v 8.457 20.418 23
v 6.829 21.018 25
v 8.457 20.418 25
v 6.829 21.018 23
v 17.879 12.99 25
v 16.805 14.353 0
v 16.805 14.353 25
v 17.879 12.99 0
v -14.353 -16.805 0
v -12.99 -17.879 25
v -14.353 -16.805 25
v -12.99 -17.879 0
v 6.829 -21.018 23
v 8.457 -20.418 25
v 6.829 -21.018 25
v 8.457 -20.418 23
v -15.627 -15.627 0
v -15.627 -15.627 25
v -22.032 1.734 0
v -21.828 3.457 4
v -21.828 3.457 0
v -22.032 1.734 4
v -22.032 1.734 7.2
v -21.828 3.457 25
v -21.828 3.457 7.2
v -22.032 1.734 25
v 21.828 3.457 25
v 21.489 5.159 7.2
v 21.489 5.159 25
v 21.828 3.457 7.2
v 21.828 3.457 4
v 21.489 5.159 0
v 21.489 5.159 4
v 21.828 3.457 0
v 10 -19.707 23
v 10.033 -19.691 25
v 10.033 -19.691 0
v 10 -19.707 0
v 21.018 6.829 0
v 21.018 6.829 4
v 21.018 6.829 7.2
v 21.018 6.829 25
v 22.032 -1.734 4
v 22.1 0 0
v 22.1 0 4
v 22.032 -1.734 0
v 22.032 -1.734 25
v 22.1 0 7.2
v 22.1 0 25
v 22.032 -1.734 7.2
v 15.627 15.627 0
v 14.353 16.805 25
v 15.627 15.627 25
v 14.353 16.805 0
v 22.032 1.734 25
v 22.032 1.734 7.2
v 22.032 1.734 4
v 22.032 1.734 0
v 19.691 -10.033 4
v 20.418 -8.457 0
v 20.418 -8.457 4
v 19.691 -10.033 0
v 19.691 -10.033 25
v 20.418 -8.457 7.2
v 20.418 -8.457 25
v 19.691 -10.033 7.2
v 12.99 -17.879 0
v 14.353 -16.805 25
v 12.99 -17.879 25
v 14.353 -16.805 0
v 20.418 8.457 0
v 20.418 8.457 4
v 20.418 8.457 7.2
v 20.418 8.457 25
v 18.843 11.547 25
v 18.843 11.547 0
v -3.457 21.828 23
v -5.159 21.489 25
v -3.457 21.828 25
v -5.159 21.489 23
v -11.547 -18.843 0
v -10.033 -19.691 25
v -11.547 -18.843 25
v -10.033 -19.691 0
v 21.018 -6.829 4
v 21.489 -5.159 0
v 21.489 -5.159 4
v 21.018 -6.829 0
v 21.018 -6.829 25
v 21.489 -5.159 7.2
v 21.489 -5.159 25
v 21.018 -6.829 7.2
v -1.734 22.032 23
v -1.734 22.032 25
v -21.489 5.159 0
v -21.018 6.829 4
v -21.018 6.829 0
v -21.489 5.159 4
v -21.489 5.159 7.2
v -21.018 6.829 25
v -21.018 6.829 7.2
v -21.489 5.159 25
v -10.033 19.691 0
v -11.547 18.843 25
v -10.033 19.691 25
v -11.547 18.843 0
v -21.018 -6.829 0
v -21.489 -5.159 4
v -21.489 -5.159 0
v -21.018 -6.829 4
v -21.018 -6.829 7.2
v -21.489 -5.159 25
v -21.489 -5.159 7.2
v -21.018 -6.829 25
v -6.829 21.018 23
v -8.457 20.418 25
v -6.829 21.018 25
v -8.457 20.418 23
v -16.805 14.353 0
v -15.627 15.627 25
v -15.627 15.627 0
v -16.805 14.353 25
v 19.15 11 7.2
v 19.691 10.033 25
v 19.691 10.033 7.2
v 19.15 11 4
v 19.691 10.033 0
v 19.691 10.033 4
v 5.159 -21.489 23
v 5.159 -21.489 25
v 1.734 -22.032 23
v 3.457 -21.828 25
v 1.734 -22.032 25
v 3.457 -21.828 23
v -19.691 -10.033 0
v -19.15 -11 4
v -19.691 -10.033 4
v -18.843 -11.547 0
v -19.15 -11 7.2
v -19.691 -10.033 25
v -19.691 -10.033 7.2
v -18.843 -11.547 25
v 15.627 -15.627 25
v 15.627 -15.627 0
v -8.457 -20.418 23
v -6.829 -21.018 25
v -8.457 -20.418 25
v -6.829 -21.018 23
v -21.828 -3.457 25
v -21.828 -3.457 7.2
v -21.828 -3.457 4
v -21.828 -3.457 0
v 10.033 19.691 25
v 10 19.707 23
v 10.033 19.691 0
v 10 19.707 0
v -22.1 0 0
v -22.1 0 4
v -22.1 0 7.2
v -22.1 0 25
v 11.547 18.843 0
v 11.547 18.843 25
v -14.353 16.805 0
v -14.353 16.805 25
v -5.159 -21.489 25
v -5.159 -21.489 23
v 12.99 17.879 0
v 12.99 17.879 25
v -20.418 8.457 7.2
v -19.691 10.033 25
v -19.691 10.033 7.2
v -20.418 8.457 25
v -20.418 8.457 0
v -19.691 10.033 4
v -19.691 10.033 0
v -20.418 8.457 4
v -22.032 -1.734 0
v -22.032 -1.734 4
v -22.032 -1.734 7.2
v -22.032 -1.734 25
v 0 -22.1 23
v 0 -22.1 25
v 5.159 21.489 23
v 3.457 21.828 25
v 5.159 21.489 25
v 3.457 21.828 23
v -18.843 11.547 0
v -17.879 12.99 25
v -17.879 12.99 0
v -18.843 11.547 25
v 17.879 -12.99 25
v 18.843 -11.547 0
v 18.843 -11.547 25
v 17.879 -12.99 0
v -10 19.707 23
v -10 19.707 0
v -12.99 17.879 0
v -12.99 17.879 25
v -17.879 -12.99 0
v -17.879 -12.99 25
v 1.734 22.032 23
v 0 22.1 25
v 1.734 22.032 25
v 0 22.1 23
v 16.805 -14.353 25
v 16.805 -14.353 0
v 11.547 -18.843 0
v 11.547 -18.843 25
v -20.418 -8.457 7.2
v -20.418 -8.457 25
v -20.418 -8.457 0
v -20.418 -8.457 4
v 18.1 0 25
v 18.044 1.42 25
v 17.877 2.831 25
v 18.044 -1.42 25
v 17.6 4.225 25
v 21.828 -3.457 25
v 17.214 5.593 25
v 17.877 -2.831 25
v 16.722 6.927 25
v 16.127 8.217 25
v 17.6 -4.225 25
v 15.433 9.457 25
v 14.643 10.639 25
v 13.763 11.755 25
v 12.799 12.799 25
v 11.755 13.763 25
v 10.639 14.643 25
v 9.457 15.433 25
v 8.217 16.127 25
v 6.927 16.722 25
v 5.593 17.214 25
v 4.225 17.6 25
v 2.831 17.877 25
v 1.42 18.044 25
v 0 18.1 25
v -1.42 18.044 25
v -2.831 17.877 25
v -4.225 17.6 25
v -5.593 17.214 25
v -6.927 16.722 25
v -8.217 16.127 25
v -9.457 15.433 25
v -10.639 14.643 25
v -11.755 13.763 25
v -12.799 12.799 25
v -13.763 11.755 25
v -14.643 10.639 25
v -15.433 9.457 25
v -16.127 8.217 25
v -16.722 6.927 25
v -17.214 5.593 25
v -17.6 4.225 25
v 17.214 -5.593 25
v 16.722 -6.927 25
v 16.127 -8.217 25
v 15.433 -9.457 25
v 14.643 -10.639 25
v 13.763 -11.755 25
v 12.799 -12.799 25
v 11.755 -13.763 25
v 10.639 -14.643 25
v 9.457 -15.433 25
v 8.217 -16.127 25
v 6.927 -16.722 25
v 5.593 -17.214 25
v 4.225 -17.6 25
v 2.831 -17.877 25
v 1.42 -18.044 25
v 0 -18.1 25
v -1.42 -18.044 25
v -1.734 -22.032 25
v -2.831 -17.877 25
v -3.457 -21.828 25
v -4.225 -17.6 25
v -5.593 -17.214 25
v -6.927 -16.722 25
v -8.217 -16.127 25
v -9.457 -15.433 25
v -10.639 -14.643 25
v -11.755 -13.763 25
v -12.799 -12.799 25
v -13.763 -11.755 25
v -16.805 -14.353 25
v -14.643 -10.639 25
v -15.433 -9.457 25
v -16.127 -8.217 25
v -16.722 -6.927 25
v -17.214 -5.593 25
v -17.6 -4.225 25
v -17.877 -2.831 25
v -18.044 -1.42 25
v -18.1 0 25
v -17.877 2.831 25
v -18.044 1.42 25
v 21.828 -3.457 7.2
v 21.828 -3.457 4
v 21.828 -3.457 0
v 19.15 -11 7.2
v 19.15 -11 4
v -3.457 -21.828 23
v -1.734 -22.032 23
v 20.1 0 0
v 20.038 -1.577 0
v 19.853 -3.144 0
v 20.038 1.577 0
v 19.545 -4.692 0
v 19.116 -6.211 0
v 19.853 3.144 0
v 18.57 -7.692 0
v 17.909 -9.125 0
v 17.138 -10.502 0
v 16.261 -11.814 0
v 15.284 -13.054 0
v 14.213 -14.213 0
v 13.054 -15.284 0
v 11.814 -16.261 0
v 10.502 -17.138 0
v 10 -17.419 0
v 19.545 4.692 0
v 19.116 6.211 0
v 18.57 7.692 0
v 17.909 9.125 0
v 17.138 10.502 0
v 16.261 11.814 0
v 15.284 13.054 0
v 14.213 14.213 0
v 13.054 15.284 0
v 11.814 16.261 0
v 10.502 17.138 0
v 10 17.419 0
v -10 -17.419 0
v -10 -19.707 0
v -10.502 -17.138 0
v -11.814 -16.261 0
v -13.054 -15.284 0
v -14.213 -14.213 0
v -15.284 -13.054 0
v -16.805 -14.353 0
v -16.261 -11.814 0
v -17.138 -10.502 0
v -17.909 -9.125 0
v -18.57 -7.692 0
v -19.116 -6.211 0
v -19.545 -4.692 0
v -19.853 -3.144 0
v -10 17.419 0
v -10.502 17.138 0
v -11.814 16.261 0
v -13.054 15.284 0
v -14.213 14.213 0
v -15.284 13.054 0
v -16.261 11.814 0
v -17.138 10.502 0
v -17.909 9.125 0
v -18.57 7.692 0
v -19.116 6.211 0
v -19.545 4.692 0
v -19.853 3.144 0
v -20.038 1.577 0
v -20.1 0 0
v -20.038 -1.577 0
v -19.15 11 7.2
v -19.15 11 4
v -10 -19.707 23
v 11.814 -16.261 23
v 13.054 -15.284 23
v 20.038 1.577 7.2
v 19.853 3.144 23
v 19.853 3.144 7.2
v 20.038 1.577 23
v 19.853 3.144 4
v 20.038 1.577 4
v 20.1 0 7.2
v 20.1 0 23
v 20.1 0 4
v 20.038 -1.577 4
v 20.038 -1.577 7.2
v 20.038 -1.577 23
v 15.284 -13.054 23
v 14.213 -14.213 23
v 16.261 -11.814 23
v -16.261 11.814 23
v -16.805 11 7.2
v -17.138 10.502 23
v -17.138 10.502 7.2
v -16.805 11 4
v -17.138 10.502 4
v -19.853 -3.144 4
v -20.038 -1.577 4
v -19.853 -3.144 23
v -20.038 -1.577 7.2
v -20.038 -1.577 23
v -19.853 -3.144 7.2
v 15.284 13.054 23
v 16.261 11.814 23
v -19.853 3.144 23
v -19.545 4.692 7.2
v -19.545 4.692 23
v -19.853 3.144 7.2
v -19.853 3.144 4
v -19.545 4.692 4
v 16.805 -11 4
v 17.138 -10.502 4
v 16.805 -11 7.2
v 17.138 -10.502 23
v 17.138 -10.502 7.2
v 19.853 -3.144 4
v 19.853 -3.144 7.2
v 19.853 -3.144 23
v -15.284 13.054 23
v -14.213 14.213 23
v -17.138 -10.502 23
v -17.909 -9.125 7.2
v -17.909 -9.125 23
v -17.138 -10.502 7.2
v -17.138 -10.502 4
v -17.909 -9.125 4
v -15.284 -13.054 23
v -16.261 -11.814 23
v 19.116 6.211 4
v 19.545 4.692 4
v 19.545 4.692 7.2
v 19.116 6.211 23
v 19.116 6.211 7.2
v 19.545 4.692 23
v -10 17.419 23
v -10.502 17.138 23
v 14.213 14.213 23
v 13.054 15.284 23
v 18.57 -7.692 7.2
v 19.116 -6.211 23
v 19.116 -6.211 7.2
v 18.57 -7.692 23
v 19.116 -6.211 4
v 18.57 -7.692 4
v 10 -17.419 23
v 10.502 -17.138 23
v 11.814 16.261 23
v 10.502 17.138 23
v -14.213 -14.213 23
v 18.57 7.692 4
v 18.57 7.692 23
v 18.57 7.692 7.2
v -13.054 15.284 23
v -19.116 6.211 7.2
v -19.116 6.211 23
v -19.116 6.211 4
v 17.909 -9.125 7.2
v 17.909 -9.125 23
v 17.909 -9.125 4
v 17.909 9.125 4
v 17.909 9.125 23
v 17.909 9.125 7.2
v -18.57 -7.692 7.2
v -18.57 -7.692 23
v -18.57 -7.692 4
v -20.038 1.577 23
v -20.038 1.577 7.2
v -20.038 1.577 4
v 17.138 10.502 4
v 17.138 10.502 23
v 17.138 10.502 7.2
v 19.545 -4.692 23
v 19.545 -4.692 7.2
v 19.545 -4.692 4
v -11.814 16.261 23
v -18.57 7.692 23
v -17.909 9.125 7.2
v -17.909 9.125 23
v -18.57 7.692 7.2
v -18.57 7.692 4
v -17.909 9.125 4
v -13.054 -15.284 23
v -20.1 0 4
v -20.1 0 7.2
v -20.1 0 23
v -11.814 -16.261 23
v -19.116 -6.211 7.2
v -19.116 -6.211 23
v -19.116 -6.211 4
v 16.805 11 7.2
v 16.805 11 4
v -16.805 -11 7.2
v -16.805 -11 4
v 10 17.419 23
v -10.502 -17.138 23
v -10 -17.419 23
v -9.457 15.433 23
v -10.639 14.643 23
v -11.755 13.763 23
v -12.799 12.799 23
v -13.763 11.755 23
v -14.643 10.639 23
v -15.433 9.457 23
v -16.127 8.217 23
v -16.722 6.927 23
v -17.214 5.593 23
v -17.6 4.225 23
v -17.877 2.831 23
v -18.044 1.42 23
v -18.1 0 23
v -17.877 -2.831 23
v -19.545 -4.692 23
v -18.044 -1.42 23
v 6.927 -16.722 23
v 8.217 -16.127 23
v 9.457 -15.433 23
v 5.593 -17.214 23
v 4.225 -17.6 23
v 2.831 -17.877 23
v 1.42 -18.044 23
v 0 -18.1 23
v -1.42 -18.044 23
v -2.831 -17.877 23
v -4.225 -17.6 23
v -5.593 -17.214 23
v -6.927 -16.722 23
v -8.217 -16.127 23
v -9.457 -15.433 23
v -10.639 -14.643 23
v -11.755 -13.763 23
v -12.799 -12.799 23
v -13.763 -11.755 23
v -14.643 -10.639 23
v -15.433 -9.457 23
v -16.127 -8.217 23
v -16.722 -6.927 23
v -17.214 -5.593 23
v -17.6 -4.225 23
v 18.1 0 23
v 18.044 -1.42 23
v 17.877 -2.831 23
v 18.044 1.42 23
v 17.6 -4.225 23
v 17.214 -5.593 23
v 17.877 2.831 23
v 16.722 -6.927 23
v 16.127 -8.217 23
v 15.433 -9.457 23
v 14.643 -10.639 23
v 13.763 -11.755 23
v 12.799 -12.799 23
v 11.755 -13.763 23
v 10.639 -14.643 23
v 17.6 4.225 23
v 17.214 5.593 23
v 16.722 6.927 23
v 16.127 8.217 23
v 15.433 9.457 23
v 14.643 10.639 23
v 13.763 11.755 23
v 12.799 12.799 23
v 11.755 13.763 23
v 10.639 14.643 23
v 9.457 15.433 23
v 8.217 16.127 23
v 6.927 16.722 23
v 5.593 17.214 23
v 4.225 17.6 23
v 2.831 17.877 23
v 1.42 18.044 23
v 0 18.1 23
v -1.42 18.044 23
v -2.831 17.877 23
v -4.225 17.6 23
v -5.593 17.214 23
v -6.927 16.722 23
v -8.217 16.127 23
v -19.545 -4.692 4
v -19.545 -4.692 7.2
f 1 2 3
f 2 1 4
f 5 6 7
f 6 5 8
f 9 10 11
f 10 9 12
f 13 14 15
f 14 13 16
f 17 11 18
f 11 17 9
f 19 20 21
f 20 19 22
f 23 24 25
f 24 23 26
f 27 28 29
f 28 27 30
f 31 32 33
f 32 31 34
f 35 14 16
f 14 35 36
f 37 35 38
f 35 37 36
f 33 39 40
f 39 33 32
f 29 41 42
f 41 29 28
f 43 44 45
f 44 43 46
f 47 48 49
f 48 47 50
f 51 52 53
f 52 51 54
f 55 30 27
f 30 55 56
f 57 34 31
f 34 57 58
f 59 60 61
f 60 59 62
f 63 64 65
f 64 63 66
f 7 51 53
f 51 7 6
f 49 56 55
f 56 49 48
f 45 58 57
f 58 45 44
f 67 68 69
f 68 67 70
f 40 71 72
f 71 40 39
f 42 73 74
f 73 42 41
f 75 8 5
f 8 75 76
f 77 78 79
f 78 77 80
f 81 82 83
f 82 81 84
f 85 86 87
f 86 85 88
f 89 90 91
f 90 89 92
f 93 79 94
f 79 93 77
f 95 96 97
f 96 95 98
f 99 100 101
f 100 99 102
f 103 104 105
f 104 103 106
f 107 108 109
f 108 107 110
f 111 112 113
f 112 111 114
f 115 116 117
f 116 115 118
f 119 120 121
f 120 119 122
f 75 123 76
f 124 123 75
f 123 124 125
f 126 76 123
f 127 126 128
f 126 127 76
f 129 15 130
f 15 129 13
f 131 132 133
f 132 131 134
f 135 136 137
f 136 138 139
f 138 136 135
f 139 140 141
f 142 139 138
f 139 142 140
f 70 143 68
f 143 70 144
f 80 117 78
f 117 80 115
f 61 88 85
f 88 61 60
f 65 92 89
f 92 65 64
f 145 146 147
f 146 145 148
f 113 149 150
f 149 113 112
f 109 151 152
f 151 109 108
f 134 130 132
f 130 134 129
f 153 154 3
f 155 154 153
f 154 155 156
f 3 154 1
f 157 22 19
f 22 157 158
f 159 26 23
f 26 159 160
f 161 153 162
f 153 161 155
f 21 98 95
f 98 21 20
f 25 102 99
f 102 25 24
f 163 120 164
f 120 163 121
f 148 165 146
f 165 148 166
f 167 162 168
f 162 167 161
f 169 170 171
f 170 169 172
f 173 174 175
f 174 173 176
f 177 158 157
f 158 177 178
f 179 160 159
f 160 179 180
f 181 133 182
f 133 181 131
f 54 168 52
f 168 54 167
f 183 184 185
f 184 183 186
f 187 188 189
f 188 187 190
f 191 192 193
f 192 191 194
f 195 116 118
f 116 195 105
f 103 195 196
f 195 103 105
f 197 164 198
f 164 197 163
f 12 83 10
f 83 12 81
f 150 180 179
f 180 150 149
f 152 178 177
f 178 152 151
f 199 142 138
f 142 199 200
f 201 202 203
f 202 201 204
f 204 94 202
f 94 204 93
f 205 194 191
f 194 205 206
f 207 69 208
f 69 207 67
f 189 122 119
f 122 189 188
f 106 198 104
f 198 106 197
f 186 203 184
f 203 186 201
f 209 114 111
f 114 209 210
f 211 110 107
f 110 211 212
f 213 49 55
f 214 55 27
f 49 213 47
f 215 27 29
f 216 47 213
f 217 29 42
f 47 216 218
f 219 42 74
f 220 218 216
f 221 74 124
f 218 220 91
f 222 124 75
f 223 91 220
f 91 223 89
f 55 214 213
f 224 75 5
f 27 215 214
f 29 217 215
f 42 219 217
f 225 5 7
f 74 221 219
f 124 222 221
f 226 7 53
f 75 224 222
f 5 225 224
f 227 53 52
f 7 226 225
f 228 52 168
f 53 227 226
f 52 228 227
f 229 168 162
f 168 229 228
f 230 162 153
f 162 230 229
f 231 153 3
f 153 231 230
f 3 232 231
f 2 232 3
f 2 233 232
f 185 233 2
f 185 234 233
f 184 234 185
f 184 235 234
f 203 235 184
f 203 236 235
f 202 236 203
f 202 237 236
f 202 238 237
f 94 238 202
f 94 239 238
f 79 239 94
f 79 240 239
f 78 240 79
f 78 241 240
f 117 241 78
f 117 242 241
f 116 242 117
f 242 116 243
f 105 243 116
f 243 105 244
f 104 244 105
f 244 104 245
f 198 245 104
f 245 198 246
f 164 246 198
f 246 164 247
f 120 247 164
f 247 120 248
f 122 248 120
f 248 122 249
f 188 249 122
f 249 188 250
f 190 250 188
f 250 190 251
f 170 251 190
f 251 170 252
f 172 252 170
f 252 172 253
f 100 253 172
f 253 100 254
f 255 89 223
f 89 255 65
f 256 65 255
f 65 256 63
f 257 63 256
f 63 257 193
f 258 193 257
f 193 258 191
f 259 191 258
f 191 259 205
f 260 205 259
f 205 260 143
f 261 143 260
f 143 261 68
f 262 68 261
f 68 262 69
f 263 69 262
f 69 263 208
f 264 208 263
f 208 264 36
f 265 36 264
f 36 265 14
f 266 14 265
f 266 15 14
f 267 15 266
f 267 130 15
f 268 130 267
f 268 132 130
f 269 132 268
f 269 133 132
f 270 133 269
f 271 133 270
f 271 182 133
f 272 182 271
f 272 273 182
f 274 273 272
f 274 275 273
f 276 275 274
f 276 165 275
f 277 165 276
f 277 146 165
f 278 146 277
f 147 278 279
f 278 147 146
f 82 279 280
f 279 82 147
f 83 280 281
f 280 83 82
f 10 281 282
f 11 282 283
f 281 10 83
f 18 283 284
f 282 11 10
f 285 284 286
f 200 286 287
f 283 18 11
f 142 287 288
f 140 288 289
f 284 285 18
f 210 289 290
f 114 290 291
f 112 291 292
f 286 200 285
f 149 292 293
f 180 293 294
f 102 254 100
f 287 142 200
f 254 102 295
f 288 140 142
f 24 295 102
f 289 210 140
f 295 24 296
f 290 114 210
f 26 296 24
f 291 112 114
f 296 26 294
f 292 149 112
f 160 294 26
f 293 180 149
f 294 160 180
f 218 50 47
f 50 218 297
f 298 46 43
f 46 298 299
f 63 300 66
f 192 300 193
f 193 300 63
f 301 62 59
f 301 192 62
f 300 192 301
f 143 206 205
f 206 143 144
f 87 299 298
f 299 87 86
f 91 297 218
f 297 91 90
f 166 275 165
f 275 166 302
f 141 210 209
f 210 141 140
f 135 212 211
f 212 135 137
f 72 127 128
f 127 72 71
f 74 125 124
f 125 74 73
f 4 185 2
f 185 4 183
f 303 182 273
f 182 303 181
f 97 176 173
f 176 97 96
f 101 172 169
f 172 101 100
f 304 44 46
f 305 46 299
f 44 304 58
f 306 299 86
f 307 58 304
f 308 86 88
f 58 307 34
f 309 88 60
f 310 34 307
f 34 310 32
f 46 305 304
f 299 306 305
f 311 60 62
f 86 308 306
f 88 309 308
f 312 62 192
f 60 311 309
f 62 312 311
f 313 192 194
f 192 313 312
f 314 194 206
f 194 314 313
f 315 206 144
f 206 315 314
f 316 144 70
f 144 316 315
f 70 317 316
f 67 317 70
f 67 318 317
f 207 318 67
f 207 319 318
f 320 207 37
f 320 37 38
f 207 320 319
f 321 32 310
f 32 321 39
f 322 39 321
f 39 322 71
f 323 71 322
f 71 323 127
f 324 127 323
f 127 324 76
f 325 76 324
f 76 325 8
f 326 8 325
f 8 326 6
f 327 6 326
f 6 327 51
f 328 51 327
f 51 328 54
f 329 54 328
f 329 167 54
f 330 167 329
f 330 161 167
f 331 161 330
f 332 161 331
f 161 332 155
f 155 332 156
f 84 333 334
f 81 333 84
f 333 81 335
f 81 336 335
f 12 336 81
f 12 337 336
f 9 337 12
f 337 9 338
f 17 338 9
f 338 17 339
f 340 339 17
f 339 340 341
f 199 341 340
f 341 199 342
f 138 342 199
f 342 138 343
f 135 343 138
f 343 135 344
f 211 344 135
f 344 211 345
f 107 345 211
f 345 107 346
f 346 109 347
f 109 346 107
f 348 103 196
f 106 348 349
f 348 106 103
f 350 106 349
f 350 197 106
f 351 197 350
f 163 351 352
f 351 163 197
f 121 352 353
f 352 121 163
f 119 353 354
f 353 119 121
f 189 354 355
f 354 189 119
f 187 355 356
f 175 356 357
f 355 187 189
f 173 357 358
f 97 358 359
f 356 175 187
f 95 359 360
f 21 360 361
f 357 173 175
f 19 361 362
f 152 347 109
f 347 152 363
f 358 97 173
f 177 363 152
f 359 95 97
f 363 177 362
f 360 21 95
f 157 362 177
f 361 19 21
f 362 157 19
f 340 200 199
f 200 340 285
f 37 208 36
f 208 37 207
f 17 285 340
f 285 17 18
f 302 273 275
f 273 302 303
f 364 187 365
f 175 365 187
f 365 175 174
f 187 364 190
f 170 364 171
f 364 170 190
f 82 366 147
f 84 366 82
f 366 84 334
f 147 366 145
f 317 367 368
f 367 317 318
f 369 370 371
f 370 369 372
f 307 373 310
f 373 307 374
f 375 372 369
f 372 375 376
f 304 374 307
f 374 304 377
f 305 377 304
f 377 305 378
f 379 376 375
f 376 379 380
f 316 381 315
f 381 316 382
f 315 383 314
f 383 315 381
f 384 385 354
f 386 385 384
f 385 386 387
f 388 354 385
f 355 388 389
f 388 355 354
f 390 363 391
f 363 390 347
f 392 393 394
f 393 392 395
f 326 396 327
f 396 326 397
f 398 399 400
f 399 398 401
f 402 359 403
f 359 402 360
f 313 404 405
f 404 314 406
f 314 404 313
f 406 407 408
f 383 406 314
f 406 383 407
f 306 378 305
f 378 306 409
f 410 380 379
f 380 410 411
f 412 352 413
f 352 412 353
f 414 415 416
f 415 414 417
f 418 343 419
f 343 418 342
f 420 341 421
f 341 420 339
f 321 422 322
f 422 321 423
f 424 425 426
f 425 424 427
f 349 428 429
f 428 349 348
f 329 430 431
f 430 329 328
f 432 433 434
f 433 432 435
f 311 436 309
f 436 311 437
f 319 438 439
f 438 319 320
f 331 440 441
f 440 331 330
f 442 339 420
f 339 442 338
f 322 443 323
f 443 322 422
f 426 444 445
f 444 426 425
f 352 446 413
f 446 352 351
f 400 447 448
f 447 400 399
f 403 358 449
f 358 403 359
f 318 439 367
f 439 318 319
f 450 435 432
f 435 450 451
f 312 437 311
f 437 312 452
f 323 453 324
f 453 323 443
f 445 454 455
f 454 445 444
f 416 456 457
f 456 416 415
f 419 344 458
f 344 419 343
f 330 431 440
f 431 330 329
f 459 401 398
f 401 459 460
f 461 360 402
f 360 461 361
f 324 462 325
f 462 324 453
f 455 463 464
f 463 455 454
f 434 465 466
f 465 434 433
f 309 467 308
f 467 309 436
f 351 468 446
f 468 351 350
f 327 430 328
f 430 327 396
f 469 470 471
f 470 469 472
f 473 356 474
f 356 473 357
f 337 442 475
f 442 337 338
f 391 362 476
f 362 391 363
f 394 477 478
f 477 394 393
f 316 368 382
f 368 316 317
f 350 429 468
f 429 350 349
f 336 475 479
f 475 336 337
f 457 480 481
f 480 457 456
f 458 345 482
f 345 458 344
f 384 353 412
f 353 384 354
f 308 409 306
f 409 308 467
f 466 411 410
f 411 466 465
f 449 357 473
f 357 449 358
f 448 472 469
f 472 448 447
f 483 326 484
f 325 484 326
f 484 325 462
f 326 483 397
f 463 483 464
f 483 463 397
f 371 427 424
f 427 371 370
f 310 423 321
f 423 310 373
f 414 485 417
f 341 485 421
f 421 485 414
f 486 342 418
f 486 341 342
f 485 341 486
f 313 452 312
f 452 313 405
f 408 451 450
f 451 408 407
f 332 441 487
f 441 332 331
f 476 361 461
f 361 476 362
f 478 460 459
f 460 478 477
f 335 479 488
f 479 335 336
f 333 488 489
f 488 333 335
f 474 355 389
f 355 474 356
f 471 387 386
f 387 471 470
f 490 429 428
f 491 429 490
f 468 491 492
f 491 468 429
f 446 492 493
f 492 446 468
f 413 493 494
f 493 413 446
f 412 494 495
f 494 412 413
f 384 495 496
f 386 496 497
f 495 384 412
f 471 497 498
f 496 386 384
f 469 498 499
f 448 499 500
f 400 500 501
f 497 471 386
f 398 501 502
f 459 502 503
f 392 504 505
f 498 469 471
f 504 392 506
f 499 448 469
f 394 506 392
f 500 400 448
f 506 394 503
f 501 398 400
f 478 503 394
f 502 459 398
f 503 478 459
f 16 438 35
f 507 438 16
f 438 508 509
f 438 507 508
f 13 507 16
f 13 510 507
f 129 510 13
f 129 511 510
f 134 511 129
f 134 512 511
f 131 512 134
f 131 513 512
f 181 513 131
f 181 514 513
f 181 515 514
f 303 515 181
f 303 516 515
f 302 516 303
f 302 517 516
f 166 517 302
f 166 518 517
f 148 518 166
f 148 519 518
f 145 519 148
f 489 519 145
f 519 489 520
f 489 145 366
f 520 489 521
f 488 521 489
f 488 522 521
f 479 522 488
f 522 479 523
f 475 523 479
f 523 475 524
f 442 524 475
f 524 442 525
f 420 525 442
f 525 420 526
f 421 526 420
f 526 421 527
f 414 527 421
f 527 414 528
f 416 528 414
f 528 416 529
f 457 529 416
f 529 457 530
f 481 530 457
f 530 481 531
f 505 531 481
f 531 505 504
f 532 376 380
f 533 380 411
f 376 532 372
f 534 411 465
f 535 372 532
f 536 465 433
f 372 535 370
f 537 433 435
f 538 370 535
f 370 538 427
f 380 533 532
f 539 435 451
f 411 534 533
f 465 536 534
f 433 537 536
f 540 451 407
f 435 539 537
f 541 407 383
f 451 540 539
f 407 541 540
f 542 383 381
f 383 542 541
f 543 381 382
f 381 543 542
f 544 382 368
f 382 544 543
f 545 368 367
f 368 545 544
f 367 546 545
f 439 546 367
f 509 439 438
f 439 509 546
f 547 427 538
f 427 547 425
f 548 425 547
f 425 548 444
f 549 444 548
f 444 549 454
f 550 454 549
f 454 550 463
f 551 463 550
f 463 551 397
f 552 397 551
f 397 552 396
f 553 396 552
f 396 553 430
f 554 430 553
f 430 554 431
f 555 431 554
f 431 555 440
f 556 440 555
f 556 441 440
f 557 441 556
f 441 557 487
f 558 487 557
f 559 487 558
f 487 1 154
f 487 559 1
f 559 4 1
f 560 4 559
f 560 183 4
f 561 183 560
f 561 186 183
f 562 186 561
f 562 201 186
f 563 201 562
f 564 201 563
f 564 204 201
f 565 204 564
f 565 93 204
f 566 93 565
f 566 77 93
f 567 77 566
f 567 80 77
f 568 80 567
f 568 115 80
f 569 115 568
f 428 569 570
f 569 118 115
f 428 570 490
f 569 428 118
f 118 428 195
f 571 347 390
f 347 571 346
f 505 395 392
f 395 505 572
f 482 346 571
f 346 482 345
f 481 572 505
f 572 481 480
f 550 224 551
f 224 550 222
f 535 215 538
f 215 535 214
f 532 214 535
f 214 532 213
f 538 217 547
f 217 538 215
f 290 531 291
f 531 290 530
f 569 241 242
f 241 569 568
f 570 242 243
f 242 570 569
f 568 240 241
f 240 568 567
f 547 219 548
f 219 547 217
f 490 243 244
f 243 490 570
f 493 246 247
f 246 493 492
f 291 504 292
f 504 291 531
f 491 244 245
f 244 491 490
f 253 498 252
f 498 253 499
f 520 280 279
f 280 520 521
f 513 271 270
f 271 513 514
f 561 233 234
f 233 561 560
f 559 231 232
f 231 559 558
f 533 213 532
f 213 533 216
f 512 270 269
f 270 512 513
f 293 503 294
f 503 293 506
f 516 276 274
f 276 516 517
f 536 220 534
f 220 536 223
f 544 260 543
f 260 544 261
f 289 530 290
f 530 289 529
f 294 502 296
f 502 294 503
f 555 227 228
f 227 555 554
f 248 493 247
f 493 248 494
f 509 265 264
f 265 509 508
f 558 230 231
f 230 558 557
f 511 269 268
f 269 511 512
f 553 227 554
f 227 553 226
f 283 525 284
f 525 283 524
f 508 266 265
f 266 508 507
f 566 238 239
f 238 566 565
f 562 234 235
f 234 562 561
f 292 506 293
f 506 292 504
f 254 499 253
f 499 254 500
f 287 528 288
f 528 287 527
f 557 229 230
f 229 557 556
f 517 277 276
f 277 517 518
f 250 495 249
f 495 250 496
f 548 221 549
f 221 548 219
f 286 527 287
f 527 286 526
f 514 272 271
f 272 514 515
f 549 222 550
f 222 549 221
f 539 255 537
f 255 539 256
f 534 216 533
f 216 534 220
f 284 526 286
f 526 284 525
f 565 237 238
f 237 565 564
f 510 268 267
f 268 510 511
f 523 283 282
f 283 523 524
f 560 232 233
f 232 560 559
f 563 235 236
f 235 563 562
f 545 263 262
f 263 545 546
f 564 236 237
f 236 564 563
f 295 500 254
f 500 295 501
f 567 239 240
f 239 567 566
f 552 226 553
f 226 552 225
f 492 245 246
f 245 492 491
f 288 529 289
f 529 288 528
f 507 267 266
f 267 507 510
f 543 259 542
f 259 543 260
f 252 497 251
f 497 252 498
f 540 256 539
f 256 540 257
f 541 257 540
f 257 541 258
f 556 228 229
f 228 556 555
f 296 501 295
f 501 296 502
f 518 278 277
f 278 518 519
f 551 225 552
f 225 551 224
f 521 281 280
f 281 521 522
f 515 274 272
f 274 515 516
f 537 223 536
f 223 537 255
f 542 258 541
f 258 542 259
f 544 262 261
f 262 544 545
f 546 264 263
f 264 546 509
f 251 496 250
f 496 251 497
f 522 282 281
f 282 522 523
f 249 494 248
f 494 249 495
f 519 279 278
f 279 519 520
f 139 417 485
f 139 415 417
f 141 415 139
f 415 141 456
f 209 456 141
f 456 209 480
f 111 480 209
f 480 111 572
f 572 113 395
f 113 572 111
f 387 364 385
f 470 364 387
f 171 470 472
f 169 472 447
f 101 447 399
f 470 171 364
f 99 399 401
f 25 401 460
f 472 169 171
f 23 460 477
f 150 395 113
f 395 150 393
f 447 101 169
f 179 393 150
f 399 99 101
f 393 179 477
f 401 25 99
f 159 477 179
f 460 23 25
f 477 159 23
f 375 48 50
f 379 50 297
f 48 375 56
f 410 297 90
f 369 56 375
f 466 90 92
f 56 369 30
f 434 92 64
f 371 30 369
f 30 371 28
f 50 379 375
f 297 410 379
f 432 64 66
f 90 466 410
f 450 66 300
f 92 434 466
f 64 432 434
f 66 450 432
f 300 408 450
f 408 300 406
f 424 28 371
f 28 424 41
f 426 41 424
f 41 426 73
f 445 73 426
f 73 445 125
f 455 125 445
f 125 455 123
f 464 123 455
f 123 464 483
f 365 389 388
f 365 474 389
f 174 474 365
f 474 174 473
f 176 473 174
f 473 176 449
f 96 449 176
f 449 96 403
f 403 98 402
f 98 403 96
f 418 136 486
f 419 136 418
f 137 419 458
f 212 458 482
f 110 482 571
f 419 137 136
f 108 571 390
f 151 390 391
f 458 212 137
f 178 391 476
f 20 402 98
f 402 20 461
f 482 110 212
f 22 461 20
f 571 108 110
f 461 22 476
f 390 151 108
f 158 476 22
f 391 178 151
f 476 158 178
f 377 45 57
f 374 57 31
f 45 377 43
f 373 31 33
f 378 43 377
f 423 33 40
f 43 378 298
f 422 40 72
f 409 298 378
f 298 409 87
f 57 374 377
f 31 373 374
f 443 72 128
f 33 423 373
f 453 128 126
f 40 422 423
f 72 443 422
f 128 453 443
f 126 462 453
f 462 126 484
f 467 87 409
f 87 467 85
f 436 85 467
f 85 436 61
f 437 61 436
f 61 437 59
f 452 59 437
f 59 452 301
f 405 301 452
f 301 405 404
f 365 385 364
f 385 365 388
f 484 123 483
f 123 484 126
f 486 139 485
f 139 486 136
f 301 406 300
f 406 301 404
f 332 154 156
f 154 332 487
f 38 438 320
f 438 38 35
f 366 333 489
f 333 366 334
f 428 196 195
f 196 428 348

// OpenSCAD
//holder for usb bike light
// Idea:
//But light in, fit ruber through slot to fixiate light

LIGHT_OUTER_DIAMETER = 40.2;
LIGHT_HEIGHT = 15.8;
THICKNESS = 2;
HOLDER_HEIGHT = 25;
RUBBER_WIDTH = 22;
RUBBER_THICKNESS = 3.2;
$fn =80;

difference()
{
    cylinder(d= LIGHT_OUTER_DIAMETER+2*THICKNESS, h=HOLDER_HEIGHT);
    cylinder(d= LIGHT_OUTER_DIAMETER, h=HOLDER_HEIGHT-2);
    cylinder(d= LIGHT_OUTER_DIAMETER-2*THICKNESS, h=HOLDER_HEIGHT);
    translate([-50,-RUBBER_WIDTH/2,HOLDER_HEIGHT-THICKNESS-LIGHT_HEIGHT-RUBBER_THICKNESS])
        cube([100,RUBBER_WIDTH,RUBBER_THICKNESS]);
    
    cube([20,300,2*HOLDER_HEIGHT-2*THICKNESS],center=true);    
}

    
